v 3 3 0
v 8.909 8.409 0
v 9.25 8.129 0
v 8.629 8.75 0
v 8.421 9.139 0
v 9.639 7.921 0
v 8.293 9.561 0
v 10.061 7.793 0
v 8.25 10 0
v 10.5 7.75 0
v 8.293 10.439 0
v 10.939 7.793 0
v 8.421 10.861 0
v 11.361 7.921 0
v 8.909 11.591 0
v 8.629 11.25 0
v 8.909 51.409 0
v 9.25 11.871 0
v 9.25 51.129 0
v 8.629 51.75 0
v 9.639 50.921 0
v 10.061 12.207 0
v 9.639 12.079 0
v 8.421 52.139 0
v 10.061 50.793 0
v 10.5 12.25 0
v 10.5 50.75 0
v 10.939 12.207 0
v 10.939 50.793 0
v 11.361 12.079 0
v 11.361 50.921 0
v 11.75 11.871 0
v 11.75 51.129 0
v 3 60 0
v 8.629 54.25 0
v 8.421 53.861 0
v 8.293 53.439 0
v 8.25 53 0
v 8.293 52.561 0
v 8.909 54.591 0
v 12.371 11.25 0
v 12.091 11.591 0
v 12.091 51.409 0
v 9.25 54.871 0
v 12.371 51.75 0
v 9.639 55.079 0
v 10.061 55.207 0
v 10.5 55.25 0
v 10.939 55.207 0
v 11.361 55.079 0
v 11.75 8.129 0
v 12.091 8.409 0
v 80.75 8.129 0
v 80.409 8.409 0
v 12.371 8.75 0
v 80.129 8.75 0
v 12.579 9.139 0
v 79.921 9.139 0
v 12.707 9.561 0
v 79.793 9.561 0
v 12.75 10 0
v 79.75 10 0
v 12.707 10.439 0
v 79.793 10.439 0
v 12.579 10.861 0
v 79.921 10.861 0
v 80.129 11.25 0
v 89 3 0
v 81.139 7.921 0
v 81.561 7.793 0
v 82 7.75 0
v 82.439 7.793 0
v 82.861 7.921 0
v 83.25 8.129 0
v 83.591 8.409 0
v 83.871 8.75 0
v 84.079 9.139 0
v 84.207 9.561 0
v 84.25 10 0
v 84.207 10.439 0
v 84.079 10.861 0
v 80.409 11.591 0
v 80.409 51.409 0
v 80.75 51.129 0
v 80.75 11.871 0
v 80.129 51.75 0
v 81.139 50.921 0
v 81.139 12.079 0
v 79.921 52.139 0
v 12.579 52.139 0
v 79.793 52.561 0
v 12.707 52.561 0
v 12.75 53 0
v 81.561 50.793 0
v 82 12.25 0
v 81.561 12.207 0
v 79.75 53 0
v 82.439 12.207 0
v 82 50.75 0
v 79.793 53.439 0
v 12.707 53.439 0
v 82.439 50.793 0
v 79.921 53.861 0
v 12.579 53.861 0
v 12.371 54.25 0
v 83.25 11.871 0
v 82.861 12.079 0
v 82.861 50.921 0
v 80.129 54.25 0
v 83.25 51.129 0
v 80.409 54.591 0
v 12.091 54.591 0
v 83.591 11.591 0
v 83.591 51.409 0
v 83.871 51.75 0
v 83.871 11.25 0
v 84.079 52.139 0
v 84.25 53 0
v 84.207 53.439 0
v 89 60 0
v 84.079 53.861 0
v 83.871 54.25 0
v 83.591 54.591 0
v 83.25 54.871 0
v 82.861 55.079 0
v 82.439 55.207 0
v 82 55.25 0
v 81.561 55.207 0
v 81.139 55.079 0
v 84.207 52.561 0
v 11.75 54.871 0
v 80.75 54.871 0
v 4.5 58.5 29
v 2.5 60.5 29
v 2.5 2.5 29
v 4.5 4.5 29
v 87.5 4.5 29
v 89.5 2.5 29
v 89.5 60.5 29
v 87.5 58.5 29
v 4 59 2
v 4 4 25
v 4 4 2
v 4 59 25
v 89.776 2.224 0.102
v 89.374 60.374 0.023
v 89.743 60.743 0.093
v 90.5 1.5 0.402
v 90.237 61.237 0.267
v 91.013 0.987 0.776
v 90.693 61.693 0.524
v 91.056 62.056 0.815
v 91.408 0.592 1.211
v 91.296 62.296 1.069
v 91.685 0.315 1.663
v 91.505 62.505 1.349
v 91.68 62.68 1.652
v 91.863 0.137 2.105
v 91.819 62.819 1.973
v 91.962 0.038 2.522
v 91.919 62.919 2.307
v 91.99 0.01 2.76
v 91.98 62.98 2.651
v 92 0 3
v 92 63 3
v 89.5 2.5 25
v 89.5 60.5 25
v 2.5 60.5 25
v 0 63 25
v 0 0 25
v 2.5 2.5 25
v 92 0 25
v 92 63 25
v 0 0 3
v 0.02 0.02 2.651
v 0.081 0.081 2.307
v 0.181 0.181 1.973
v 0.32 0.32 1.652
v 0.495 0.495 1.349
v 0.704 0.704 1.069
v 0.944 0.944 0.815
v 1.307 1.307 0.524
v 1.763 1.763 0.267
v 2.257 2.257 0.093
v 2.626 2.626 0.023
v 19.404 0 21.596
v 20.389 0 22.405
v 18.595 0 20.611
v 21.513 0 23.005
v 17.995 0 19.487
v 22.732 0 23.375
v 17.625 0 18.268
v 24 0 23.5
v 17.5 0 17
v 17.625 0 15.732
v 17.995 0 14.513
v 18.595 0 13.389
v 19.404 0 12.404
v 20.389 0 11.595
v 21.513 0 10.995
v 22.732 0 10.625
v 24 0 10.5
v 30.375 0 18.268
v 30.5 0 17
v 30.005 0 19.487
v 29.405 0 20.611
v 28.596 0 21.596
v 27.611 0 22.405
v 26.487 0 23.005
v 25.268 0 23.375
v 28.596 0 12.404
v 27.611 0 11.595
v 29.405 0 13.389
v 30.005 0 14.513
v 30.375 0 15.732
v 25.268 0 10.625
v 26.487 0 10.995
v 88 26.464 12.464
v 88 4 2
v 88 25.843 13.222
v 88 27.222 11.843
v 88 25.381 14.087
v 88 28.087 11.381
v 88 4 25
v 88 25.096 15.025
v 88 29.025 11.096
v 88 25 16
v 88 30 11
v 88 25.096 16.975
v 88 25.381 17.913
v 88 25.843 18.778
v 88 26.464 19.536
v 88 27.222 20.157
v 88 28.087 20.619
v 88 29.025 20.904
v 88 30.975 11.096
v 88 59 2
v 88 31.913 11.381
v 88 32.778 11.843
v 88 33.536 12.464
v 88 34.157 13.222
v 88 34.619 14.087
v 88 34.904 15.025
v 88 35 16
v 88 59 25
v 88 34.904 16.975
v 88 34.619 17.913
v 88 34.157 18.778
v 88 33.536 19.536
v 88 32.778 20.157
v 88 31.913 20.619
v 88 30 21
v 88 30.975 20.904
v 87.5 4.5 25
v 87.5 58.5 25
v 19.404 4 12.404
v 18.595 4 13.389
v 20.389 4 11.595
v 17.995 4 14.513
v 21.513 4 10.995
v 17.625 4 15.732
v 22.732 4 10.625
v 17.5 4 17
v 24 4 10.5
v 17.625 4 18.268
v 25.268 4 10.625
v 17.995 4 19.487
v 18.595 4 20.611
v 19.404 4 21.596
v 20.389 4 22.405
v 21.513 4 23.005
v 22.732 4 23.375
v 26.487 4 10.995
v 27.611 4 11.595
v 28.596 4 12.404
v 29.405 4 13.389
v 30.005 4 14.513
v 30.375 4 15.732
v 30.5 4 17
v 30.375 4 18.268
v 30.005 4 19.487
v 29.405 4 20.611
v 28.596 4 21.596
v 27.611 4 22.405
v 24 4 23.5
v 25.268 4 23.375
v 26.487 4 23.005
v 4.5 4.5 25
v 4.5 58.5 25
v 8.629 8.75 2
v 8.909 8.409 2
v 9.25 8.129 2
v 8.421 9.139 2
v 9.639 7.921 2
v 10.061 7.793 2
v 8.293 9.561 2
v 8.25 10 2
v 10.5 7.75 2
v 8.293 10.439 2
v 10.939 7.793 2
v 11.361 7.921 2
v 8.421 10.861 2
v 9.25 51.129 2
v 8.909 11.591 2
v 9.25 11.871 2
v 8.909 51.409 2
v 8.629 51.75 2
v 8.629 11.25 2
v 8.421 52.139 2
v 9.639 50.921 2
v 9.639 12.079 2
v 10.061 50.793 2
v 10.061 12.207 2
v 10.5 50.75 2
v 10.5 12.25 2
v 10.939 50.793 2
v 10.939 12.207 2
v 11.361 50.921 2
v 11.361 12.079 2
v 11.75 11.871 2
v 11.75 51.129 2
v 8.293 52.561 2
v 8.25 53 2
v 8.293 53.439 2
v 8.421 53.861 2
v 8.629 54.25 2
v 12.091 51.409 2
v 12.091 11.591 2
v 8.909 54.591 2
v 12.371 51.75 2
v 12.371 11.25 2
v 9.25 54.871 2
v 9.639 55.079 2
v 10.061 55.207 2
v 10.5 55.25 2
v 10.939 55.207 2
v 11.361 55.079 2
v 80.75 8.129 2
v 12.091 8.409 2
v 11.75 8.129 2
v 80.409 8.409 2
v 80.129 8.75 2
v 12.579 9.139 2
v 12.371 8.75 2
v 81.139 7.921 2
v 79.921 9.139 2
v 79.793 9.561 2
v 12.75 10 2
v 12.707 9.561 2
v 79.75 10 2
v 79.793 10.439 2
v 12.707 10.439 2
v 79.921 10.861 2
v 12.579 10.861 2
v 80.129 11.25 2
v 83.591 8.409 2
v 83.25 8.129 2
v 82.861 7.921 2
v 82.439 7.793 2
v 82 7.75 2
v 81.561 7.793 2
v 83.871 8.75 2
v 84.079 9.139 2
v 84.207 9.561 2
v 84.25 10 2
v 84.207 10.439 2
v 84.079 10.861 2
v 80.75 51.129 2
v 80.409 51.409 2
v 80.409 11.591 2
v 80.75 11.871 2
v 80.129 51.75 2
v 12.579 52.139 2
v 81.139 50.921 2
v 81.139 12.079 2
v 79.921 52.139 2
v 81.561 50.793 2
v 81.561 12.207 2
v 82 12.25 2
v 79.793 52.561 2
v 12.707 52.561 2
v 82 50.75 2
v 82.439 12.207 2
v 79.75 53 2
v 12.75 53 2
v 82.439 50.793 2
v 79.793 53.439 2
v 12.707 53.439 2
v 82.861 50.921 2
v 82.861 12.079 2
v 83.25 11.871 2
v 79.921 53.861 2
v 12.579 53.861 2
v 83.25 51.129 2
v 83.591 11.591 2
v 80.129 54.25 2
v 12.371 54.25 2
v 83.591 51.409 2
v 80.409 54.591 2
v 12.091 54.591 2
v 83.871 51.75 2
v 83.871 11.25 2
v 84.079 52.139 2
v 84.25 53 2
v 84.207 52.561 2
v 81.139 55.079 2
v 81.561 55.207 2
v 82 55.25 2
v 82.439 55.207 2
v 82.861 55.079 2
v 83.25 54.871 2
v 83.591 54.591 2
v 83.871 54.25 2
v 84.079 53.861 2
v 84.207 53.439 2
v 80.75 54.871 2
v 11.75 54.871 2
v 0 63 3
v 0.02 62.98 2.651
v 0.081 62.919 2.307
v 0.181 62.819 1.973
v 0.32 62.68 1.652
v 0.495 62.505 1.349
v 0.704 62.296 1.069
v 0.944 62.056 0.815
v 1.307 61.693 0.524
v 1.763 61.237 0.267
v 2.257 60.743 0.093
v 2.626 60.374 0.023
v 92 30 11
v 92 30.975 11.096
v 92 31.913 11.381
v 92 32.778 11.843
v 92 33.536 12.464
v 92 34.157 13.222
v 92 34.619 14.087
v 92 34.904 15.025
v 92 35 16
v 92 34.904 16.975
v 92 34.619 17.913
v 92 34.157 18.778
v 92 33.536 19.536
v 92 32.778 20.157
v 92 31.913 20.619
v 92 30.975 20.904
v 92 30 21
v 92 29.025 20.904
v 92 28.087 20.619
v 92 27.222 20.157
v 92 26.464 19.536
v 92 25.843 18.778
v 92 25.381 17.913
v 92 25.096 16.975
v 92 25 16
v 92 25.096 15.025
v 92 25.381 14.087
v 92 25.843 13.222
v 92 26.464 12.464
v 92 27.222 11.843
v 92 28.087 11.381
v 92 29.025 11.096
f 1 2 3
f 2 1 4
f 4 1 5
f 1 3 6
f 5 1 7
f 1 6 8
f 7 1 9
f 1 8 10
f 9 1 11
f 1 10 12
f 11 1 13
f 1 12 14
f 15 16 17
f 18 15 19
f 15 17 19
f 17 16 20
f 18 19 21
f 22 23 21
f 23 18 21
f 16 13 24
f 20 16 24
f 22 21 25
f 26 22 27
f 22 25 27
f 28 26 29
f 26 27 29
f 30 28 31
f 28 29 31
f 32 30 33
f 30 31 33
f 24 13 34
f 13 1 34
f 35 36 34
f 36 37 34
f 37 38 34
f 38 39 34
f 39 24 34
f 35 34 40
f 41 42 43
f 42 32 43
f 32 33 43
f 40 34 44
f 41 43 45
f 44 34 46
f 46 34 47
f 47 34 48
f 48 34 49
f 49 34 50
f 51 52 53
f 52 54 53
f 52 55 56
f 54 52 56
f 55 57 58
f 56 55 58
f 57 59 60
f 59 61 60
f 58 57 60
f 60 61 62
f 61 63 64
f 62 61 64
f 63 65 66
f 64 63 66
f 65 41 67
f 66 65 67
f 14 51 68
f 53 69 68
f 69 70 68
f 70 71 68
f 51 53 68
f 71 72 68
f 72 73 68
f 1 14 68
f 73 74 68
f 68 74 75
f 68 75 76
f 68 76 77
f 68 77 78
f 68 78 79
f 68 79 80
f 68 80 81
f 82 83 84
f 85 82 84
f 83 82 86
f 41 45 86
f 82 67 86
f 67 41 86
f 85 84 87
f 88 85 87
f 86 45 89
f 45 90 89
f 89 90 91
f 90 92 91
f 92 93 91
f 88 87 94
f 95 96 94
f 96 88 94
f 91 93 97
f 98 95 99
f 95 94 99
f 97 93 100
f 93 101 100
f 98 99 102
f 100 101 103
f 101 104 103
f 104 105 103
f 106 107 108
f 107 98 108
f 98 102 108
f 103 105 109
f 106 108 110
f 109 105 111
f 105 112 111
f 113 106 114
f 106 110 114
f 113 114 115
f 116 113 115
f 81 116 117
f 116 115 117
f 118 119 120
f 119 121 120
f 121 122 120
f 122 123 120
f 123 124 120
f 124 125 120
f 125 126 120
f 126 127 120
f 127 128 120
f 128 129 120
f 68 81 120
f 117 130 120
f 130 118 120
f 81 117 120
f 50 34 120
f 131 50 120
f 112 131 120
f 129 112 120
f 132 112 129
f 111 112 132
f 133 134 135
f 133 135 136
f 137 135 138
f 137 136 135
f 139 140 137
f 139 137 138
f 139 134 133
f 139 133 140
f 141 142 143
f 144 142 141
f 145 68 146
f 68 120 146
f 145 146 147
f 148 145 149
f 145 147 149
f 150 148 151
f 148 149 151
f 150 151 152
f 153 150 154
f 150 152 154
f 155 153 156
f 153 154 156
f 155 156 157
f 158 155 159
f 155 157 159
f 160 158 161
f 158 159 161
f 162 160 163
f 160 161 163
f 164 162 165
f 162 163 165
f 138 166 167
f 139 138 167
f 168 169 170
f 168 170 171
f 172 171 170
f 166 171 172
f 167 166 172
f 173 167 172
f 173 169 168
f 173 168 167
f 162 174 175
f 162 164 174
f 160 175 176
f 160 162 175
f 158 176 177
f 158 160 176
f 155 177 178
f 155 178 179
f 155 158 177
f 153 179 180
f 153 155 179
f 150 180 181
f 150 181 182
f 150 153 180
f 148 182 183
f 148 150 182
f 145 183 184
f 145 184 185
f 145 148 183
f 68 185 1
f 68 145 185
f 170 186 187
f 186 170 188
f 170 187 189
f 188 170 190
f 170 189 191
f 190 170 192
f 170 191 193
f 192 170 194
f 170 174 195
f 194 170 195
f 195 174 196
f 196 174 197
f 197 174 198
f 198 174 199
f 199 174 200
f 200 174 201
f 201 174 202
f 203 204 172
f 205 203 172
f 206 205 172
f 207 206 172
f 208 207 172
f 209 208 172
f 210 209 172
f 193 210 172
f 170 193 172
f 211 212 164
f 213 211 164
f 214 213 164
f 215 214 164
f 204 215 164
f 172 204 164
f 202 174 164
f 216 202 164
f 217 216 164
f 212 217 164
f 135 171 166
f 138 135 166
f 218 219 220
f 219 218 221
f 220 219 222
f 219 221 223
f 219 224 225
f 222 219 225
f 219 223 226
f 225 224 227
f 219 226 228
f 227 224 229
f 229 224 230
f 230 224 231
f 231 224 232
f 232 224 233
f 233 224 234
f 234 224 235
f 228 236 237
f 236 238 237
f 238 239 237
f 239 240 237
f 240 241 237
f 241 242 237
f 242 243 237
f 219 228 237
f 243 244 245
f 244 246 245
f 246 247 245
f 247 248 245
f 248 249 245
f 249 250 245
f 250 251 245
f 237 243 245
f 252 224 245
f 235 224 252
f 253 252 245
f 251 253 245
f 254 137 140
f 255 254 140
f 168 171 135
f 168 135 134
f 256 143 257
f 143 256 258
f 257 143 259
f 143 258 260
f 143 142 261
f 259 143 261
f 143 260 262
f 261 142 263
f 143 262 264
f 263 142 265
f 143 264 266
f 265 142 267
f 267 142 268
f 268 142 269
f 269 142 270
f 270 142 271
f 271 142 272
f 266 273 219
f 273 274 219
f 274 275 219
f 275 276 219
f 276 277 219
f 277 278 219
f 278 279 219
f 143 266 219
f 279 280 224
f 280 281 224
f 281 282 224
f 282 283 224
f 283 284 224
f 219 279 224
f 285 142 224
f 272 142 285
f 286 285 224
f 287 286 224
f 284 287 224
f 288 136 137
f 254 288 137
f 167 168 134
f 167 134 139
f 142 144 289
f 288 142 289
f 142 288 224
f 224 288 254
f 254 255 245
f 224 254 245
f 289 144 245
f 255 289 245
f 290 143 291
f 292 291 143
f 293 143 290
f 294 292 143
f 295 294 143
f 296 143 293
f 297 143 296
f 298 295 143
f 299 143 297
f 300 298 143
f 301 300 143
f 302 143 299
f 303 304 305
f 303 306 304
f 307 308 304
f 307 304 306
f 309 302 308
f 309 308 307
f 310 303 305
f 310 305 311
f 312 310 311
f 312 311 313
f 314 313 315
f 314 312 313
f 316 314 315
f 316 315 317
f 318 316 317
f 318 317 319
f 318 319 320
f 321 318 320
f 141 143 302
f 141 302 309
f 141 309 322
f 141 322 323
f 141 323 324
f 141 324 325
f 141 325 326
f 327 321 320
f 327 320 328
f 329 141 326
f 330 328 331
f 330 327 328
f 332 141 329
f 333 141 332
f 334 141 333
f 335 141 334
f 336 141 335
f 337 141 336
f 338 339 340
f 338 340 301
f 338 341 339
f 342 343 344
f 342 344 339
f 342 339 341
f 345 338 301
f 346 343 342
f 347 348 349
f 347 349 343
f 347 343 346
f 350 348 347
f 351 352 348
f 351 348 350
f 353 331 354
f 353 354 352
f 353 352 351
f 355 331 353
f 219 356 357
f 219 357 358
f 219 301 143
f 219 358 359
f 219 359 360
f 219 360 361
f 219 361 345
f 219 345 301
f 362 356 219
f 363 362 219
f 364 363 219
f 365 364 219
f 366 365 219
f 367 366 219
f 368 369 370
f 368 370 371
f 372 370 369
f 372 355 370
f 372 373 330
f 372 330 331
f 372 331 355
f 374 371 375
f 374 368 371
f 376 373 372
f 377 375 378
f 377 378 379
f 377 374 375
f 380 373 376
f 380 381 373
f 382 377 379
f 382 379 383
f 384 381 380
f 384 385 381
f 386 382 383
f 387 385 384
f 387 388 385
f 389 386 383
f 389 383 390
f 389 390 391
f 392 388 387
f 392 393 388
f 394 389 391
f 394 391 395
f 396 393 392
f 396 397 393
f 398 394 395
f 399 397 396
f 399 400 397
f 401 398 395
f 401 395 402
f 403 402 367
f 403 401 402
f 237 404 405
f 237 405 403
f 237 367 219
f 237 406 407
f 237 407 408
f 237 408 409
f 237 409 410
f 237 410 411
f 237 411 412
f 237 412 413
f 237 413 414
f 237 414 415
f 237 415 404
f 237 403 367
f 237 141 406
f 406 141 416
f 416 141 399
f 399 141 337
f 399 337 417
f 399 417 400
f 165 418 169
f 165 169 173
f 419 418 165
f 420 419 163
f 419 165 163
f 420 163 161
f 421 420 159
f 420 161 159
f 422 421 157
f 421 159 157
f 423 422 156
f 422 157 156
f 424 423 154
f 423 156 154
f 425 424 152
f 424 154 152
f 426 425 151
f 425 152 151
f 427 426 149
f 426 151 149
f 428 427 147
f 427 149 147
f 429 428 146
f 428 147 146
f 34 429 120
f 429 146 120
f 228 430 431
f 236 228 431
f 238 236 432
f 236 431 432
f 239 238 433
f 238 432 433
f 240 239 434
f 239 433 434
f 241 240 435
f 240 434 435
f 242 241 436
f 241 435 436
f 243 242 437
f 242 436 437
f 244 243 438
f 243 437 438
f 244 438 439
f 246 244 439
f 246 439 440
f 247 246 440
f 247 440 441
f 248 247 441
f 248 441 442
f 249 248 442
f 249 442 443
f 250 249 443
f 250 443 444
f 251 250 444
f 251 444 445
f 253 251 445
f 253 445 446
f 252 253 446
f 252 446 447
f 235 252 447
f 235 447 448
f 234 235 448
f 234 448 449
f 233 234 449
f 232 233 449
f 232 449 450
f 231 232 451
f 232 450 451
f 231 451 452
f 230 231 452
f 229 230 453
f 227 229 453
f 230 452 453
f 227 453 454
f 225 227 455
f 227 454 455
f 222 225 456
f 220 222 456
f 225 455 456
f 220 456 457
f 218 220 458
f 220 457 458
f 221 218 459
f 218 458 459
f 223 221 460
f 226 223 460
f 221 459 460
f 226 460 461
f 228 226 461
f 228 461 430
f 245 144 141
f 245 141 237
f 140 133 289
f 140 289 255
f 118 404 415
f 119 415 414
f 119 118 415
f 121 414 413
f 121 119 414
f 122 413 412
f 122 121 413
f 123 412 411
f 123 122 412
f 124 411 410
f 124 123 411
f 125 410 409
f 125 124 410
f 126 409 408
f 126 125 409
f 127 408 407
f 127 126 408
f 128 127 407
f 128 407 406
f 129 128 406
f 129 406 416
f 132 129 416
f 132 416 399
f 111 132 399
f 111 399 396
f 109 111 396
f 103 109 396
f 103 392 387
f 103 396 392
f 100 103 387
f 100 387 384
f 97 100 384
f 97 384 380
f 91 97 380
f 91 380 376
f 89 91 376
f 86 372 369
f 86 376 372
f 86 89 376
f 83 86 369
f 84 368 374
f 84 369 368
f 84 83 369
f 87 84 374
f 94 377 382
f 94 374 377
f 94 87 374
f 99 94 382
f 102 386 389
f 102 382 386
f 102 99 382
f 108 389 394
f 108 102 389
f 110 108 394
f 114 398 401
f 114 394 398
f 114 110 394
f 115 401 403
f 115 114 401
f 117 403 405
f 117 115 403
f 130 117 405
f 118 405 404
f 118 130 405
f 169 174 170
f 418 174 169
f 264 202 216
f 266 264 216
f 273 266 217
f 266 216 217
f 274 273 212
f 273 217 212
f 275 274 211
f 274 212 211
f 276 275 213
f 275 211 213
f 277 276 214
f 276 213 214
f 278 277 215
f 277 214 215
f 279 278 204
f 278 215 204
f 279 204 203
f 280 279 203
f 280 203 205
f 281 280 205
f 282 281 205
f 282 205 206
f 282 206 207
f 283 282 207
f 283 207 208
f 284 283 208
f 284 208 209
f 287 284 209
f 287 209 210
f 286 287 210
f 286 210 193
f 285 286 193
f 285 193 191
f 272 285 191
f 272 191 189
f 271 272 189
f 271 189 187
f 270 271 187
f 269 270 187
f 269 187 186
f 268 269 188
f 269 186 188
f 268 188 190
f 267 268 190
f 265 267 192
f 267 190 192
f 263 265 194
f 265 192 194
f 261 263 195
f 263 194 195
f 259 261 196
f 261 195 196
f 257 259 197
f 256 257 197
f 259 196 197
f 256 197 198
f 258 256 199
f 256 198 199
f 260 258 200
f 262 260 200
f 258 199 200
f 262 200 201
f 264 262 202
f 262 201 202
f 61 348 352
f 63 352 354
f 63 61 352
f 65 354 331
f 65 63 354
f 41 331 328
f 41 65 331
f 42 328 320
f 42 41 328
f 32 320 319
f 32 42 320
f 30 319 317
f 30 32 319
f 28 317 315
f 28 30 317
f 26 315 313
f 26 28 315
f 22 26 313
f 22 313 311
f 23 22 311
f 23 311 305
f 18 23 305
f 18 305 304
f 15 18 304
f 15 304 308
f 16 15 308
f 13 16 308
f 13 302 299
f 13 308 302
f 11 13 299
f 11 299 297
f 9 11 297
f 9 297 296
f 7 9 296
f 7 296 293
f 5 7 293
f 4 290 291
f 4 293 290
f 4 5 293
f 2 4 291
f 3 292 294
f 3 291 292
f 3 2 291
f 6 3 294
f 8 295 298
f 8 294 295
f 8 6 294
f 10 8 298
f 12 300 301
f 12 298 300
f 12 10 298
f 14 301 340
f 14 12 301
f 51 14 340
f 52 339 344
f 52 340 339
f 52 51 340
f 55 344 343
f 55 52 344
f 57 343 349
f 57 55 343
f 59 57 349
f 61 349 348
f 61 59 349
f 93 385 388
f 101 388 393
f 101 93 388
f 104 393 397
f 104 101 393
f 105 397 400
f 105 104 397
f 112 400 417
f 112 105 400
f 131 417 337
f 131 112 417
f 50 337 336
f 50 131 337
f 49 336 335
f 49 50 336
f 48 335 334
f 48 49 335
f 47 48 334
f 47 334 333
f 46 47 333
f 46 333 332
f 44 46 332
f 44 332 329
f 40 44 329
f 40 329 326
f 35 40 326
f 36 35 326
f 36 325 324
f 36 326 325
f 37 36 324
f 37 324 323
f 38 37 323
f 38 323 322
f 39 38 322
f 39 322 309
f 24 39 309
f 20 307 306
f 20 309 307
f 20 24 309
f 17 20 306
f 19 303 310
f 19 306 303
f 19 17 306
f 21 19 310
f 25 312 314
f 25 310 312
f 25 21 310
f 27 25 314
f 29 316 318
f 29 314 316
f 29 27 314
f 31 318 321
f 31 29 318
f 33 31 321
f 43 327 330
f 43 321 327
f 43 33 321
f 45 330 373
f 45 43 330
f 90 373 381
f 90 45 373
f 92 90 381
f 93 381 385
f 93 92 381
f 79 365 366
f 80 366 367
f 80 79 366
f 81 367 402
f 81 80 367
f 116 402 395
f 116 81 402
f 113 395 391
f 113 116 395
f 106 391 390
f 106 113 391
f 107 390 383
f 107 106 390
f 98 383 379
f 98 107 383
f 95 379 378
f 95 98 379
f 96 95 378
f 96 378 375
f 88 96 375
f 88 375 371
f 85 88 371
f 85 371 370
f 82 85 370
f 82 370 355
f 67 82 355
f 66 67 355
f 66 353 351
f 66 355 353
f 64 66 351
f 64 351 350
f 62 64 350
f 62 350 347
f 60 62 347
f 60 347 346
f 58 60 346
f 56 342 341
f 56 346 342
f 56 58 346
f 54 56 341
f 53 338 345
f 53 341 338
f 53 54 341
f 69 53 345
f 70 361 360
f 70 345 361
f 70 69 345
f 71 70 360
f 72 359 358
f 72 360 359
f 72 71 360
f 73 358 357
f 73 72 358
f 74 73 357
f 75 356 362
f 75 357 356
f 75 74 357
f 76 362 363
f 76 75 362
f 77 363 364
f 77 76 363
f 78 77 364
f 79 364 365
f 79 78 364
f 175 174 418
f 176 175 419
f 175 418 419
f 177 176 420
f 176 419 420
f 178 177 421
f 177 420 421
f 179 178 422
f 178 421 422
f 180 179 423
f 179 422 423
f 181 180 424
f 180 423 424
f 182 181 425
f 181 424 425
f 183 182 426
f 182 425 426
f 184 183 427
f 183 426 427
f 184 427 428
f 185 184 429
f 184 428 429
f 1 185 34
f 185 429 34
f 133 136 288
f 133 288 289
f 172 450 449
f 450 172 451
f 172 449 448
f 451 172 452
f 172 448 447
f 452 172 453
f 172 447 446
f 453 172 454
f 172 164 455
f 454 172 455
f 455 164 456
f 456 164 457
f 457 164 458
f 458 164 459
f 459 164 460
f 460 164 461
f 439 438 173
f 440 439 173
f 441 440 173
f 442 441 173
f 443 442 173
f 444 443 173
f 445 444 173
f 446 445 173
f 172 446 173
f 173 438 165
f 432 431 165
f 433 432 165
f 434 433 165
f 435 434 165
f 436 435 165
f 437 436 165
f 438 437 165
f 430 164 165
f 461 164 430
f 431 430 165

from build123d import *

# Parameters (mm, degrees)
SKETCH3_W           = 92
SKETCH3_H           = 63
SKETCH3_R           = 2.25
BOSS_EXTRUDE3_DEPTH = 25
SKETCH4_W           = 84
SKETCH4_H           = 55
CUT_EXTRUDE1_DEPTH  = 23
FILLET1_R           = 3
SKETCH5_W           = 87
SKETCH5_H           = 58
BOSS_EXTRUDE4_DEPTH = 4
SKETCH7_W           = 83
SKETCH7_H           = 54
CUT_EXTRUDE4_DEPTH  = 27
SKETCH9_R           = 6.5
CUT_EXTRUDE6_DEPTH  = 27
SKETCH11_R          = 5
CUT_EXTRUDE7_DEPTH  = 27


with BuildPart() as part:
    # Sketch3 → Boss-Extrude3 (new body)
    with BuildSketch(Plane.XY):
        with Locations((46, 31.5)):
            Rectangle(SKETCH3_W, SKETCH3_H)
        with Locations((82, 53)):
            Circle(SKETCH3_R, mode=Mode.SUBTRACT)
        with Locations((82, 10)):
            Circle(SKETCH3_R, mode=Mode.SUBTRACT)
        with Locations((10.5, 10)):
            Circle(SKETCH3_R, mode=Mode.SUBTRACT)
        with Locations((10.5, 53)):
            Circle(SKETCH3_R, mode=Mode.SUBTRACT)
    extrude(amount=BOSS_EXTRUDE3_DEPTH)

    # Sketch4 → Cut-Extrude1 (cut)
    with BuildSketch(Plane.XY.offset(25)):
        with Locations((46, 31.5)):
            Rectangle(SKETCH4_W, SKETCH4_H)
    extrude(amount=-CUT_EXTRUDE1_DEPTH, mode=Mode.SUBTRACT)

    # Fillet1
    fillet1_edges = [part.edges().sort_by_distance(p)[0] for p in [
        (46, 63, 0),
        (92, 31.5, 0),
        (46, 0, 0),
        (0, 31.5, 0),
    ]]
    fillet(fillet1_edges, radius=FILLET1_R)

    # Sketch5 → Boss-Extrude4 (add)
    with BuildSketch(Plane.XY.offset(25)):
        with Locations((46, 31.5)):
            Rectangle(SKETCH5_W, SKETCH5_H)
    extrude(amount=BOSS_EXTRUDE4_DEPTH)

    # Sketch7 → Cut-Extrude4 (cut)
    with BuildSketch(Plane.XY.offset(29)):
        with Locations((46, 31.5)):
            Rectangle(SKETCH7_W, SKETCH7_H)
    extrude(amount=-CUT_EXTRUDE4_DEPTH, mode=Mode.SUBTRACT)

    # Sketch9 → Cut-Extrude6 (cut)
    with BuildSketch(Plane.XZ):
        with Locations(Location((24, 17, 0), (0, 0, 270))):
            Circle(SKETCH9_R)
    extrude(amount=-CUT_EXTRUDE6_DEPTH, mode=Mode.SUBTRACT)

    # Sketch11 → Cut-Extrude7 (cut)
    with BuildSketch(Plane(origin=(92, 0, 0), x_dir=(0, 0, -1), z_dir=(1, 0, 0))):
        with Locations((-16, 30)):
            Circle(SKETCH11_R)
    extrude(amount=-CUT_EXTRUDE7_DEPTH, mode=Mode.SUBTRACT)


solid = part.part
